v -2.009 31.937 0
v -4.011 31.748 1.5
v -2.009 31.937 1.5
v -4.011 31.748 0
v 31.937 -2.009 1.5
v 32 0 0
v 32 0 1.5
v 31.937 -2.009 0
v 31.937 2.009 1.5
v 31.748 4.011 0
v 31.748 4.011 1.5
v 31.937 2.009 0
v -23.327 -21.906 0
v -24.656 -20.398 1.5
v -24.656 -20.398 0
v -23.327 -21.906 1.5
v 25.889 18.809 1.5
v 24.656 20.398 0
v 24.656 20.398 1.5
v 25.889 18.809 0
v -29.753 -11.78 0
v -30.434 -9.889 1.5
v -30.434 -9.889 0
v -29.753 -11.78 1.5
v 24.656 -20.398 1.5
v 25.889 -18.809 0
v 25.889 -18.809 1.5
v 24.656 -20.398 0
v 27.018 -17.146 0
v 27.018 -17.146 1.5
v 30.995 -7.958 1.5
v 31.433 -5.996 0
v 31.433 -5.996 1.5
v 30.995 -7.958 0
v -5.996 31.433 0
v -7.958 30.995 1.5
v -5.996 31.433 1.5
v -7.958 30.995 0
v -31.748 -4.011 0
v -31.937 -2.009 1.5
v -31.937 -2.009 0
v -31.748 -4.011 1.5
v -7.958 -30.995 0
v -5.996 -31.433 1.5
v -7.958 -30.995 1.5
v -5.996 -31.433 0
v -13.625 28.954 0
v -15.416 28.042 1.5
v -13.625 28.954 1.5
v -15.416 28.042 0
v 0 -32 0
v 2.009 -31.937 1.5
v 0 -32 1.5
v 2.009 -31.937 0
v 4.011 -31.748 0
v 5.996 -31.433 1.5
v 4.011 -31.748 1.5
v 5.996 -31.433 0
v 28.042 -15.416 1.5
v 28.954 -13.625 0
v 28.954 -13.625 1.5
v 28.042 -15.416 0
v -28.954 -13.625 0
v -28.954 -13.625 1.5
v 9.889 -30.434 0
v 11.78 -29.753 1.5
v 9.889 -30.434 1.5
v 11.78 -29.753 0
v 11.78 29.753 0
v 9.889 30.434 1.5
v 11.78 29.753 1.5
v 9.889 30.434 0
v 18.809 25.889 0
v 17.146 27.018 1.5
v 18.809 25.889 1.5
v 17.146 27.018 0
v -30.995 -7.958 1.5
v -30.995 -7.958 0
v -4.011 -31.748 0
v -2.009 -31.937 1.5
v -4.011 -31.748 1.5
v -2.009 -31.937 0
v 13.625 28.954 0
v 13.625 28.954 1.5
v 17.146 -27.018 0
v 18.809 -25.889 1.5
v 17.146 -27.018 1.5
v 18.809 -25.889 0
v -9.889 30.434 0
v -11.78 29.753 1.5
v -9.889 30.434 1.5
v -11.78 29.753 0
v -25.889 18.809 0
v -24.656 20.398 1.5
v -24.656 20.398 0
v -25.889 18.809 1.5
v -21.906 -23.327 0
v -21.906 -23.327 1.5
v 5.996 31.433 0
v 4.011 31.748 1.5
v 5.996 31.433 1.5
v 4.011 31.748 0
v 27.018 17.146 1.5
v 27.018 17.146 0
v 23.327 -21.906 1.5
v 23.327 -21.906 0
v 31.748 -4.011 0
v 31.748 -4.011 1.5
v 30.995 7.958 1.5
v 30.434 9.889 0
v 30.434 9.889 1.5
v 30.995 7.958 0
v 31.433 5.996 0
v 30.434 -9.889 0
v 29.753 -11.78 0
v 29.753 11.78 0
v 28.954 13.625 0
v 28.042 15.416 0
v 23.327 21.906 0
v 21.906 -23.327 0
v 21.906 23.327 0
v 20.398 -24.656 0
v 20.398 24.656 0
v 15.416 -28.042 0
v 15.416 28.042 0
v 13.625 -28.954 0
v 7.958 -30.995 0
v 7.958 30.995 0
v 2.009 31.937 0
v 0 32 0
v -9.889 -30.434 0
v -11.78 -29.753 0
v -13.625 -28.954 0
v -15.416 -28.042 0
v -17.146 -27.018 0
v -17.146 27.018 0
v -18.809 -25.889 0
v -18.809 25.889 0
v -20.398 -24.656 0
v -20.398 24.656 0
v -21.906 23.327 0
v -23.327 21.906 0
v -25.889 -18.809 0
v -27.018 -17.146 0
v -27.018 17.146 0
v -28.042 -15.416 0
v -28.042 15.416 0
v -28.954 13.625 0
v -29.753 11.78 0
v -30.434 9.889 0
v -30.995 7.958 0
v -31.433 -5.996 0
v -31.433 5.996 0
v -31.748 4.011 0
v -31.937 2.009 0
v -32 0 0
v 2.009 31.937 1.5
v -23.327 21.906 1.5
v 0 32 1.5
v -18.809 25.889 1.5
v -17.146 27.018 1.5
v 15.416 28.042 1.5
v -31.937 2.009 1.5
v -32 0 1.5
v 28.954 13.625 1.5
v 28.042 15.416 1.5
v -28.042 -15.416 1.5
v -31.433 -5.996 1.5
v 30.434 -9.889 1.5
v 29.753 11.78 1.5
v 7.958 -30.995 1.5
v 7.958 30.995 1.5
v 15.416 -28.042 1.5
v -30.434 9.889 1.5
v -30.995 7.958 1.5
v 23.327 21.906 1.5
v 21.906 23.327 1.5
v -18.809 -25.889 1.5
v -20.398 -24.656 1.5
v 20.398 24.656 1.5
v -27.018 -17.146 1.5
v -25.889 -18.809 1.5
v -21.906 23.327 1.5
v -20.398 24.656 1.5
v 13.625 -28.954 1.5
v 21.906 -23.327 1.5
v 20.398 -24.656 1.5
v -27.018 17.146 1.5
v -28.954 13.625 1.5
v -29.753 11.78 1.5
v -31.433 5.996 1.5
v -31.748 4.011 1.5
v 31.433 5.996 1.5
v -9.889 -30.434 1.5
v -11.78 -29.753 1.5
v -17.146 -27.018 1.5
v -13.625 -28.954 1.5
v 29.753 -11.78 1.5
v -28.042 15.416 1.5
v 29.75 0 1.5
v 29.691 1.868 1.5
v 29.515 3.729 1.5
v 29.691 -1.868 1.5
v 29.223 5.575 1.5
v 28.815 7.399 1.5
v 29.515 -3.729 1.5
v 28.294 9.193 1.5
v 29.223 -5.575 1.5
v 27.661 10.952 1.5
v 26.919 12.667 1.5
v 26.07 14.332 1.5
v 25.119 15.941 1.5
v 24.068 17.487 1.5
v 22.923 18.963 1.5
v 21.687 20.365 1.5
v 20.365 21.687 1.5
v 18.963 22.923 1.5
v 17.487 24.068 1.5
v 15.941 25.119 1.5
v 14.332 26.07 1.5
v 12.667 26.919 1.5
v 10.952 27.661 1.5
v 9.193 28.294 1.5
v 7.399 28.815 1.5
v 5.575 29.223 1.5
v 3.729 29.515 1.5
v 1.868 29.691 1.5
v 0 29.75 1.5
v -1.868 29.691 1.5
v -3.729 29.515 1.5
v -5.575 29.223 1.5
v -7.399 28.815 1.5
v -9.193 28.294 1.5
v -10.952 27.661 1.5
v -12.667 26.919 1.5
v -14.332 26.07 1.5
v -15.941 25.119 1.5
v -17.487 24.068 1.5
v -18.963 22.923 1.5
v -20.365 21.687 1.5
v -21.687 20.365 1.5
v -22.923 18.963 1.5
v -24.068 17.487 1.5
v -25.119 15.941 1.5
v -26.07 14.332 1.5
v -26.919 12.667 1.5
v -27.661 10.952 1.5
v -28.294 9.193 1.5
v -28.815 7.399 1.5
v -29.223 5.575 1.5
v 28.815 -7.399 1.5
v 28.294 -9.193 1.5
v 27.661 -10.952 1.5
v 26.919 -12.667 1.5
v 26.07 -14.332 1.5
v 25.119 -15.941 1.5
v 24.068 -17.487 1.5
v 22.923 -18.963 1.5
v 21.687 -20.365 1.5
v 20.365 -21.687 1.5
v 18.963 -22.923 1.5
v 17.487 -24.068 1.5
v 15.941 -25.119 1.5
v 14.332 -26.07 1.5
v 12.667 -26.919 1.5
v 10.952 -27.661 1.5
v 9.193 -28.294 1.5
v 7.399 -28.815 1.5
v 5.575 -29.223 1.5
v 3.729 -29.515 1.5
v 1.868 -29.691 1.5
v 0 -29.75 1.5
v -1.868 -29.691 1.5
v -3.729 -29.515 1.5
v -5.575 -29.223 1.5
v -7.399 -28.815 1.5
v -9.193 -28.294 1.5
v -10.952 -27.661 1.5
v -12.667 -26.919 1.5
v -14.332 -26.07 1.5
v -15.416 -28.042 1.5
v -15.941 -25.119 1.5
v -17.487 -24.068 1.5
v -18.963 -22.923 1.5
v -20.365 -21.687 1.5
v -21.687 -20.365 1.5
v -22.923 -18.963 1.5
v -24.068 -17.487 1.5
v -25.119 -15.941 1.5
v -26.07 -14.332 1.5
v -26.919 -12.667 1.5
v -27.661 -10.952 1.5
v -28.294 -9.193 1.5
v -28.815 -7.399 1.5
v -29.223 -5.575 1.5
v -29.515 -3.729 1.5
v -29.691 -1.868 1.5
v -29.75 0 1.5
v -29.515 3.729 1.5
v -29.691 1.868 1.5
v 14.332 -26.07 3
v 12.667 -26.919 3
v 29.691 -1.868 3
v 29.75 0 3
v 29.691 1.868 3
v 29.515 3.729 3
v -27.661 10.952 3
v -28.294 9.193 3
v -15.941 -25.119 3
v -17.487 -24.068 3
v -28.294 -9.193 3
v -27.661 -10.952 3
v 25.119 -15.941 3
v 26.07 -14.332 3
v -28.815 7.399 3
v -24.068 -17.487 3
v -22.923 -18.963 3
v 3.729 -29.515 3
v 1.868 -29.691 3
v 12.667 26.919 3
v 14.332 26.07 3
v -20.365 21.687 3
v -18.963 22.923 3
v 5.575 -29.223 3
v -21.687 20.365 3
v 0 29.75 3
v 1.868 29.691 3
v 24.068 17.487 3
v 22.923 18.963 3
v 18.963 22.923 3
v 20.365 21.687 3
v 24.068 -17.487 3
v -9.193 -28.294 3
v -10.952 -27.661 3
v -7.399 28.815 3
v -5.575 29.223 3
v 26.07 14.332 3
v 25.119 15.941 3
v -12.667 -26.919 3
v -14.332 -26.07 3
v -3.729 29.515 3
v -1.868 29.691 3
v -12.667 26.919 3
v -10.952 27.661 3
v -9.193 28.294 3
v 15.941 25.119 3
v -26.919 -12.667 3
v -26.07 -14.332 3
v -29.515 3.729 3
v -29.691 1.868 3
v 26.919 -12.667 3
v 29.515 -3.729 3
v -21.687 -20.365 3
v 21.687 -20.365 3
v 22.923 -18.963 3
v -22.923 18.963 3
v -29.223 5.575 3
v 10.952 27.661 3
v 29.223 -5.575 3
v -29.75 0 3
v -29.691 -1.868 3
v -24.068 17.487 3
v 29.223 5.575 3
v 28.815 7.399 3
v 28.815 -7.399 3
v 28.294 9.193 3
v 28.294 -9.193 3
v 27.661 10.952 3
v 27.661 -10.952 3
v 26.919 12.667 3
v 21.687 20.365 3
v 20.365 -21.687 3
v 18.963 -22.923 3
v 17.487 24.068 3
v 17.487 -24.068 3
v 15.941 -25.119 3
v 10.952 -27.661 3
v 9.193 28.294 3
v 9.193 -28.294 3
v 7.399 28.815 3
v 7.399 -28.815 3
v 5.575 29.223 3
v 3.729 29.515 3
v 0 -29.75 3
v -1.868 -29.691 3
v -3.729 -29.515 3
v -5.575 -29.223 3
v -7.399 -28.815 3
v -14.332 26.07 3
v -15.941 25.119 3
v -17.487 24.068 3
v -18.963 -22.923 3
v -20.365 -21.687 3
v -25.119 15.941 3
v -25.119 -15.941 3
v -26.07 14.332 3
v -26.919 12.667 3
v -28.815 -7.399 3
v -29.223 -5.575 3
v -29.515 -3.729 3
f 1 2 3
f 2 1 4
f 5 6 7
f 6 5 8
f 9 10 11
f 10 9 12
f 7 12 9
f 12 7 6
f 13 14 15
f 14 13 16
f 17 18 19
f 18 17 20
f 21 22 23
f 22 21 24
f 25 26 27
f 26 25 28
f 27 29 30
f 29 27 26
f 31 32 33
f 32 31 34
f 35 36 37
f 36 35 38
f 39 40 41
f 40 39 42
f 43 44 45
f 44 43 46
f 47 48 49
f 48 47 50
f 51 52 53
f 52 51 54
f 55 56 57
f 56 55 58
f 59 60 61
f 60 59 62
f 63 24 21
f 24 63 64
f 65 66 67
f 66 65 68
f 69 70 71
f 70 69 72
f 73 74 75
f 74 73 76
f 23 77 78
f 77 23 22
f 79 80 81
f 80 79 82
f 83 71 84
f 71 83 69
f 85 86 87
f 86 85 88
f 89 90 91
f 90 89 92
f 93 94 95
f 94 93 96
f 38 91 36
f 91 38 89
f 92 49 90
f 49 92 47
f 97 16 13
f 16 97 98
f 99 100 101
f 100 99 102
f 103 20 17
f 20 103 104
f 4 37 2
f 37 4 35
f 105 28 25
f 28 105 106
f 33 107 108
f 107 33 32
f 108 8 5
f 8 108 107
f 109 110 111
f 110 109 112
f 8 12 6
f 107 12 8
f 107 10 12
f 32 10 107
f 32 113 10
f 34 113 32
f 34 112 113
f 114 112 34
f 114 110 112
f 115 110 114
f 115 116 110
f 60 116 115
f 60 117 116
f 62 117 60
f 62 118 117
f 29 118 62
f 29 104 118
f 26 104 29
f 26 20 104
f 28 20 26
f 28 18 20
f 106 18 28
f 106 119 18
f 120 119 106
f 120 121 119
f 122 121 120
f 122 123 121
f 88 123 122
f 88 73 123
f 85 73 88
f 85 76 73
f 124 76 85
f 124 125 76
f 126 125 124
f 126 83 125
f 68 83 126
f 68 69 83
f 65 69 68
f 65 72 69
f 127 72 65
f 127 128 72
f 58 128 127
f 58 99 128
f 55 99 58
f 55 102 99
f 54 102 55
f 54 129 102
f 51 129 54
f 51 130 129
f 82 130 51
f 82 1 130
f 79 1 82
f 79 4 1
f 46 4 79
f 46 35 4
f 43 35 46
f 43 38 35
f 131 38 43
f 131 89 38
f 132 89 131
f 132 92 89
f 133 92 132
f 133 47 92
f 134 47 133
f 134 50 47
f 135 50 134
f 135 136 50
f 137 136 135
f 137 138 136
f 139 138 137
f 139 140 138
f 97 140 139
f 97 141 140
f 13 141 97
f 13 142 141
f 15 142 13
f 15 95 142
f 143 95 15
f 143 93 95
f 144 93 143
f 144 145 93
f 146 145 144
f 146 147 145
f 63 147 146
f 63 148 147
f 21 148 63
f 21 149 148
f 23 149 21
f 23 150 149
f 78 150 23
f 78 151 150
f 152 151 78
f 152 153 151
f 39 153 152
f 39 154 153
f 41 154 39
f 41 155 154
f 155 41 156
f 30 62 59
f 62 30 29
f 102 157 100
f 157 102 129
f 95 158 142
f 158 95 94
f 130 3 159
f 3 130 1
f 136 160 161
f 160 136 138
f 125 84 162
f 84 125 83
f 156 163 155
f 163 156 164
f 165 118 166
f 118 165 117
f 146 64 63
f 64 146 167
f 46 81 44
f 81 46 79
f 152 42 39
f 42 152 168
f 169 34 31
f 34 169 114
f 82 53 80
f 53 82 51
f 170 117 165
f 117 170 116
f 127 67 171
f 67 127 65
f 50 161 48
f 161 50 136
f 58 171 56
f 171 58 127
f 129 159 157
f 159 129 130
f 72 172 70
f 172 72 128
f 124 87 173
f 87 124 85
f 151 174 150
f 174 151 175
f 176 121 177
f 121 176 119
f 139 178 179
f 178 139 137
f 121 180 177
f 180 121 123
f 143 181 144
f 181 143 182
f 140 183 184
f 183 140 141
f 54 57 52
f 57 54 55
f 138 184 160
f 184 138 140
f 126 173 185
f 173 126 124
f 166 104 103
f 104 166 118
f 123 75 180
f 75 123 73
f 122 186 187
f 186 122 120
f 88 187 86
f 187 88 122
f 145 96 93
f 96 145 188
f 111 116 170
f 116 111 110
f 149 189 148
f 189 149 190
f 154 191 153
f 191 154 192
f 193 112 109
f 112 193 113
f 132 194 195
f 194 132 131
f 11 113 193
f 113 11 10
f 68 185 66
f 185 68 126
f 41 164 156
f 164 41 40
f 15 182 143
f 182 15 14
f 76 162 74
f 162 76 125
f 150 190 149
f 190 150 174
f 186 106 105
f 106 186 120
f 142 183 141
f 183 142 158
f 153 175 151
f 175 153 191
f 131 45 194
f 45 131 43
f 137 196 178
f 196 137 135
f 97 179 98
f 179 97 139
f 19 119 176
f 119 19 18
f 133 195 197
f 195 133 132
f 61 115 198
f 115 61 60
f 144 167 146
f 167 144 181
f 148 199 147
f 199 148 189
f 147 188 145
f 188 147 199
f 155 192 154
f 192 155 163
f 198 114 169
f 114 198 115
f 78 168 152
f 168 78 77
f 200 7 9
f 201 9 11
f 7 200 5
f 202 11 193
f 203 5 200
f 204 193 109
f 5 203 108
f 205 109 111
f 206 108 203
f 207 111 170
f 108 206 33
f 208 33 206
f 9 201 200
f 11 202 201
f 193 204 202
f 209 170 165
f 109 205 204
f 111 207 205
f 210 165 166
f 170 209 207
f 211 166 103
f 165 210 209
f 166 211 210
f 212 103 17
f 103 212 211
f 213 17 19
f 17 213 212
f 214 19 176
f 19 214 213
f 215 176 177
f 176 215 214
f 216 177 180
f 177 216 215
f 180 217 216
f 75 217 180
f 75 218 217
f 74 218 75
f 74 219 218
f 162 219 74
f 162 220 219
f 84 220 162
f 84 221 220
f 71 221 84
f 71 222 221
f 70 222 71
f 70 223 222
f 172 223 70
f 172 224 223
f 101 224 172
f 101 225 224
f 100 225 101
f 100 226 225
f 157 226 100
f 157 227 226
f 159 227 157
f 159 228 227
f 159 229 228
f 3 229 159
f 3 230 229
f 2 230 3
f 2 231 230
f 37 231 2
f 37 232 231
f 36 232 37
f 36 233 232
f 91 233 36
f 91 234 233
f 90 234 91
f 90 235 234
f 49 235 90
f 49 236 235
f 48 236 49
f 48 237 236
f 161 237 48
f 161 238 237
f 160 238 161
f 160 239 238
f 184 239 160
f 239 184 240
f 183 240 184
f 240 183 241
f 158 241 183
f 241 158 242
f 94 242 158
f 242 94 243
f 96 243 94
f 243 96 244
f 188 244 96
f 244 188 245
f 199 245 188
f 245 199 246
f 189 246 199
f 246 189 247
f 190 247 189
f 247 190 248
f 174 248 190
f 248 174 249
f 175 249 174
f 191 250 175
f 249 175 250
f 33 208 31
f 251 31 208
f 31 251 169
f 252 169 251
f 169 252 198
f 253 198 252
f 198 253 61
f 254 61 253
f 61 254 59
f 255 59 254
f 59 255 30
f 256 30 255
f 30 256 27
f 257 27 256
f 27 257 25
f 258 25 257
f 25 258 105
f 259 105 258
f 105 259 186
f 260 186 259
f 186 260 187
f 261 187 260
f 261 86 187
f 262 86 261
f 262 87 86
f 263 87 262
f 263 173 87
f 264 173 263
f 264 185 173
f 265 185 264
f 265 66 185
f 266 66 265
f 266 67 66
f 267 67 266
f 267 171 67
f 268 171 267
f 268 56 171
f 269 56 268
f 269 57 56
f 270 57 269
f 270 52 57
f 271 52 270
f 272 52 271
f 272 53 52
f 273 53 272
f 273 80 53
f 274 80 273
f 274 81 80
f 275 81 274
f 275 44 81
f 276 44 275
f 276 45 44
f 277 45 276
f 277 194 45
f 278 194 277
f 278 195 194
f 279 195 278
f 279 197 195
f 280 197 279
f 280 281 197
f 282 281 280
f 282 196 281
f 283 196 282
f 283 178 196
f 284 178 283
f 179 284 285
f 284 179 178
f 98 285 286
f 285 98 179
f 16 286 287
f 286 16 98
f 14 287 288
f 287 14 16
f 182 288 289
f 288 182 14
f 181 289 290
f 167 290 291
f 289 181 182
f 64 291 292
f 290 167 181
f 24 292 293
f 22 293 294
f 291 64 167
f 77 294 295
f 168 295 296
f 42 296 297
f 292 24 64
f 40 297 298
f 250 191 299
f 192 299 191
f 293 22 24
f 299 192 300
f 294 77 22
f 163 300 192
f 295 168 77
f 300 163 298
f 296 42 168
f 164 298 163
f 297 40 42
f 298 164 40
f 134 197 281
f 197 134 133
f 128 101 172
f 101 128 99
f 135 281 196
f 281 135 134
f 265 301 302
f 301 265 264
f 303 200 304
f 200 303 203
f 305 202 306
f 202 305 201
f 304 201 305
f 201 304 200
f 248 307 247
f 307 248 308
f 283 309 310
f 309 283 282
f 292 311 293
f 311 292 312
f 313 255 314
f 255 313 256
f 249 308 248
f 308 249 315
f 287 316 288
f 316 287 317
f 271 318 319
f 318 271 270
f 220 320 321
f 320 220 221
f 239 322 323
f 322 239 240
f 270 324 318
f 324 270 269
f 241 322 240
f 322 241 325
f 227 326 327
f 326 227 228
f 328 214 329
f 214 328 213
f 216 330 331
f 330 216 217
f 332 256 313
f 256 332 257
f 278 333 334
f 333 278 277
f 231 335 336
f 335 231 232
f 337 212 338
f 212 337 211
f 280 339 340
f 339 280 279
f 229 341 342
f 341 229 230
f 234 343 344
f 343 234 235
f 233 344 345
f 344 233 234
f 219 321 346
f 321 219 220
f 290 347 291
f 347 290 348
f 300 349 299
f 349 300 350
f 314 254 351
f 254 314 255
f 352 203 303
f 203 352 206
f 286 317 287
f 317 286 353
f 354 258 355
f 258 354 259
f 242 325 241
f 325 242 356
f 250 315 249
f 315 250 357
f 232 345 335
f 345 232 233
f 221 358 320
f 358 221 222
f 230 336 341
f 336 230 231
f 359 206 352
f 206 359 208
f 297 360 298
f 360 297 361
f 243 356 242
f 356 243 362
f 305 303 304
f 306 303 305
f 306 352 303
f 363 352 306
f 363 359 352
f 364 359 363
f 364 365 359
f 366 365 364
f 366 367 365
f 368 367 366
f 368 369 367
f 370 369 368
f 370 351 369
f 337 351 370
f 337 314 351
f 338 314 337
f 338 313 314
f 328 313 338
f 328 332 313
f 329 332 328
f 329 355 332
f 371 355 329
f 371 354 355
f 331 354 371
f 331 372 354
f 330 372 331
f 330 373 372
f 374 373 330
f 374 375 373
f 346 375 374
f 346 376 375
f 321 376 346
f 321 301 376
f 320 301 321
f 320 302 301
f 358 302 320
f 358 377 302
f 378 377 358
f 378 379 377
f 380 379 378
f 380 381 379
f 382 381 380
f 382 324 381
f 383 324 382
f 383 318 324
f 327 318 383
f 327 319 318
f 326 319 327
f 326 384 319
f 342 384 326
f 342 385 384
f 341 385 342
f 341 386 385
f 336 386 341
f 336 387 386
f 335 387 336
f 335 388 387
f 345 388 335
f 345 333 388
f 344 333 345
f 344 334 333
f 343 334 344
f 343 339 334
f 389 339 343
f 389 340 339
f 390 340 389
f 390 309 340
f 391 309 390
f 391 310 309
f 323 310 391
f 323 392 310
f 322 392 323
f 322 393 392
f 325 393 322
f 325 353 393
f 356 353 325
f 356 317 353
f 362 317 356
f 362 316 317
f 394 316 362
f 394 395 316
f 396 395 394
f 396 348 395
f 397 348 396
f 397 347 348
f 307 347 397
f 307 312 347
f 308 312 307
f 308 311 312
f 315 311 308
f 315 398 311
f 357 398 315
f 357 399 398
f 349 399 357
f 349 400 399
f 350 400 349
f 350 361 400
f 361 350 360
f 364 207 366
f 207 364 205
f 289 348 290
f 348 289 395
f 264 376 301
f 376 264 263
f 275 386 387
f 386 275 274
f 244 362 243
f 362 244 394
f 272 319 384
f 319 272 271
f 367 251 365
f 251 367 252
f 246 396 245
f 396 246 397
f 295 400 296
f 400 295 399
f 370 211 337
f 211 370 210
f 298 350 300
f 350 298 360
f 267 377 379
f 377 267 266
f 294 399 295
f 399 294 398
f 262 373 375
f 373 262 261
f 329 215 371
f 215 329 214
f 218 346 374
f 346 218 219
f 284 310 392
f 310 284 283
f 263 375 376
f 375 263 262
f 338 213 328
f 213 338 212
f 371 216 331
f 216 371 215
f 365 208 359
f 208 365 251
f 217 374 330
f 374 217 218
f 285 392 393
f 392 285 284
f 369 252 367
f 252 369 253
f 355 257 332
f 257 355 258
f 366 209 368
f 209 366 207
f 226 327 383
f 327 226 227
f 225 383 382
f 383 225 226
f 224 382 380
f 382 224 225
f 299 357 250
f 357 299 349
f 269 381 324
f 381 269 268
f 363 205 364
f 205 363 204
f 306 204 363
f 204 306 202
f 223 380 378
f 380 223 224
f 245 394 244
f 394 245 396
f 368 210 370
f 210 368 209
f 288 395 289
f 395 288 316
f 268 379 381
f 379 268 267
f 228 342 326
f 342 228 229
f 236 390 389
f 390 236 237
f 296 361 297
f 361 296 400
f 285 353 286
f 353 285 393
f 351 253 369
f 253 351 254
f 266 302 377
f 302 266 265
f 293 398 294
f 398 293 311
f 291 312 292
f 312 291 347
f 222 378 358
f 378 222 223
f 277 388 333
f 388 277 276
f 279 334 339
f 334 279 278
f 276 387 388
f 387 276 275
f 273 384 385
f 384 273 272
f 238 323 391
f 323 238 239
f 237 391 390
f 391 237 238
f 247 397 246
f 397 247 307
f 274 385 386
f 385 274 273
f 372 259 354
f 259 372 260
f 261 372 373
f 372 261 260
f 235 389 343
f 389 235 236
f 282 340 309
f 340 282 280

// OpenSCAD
$fn=100;   
      
cylinder(d=64,h=1.5);
translate([0,0,1.5]){
    cylinder(d=59.5,h=1.5);
}
    
